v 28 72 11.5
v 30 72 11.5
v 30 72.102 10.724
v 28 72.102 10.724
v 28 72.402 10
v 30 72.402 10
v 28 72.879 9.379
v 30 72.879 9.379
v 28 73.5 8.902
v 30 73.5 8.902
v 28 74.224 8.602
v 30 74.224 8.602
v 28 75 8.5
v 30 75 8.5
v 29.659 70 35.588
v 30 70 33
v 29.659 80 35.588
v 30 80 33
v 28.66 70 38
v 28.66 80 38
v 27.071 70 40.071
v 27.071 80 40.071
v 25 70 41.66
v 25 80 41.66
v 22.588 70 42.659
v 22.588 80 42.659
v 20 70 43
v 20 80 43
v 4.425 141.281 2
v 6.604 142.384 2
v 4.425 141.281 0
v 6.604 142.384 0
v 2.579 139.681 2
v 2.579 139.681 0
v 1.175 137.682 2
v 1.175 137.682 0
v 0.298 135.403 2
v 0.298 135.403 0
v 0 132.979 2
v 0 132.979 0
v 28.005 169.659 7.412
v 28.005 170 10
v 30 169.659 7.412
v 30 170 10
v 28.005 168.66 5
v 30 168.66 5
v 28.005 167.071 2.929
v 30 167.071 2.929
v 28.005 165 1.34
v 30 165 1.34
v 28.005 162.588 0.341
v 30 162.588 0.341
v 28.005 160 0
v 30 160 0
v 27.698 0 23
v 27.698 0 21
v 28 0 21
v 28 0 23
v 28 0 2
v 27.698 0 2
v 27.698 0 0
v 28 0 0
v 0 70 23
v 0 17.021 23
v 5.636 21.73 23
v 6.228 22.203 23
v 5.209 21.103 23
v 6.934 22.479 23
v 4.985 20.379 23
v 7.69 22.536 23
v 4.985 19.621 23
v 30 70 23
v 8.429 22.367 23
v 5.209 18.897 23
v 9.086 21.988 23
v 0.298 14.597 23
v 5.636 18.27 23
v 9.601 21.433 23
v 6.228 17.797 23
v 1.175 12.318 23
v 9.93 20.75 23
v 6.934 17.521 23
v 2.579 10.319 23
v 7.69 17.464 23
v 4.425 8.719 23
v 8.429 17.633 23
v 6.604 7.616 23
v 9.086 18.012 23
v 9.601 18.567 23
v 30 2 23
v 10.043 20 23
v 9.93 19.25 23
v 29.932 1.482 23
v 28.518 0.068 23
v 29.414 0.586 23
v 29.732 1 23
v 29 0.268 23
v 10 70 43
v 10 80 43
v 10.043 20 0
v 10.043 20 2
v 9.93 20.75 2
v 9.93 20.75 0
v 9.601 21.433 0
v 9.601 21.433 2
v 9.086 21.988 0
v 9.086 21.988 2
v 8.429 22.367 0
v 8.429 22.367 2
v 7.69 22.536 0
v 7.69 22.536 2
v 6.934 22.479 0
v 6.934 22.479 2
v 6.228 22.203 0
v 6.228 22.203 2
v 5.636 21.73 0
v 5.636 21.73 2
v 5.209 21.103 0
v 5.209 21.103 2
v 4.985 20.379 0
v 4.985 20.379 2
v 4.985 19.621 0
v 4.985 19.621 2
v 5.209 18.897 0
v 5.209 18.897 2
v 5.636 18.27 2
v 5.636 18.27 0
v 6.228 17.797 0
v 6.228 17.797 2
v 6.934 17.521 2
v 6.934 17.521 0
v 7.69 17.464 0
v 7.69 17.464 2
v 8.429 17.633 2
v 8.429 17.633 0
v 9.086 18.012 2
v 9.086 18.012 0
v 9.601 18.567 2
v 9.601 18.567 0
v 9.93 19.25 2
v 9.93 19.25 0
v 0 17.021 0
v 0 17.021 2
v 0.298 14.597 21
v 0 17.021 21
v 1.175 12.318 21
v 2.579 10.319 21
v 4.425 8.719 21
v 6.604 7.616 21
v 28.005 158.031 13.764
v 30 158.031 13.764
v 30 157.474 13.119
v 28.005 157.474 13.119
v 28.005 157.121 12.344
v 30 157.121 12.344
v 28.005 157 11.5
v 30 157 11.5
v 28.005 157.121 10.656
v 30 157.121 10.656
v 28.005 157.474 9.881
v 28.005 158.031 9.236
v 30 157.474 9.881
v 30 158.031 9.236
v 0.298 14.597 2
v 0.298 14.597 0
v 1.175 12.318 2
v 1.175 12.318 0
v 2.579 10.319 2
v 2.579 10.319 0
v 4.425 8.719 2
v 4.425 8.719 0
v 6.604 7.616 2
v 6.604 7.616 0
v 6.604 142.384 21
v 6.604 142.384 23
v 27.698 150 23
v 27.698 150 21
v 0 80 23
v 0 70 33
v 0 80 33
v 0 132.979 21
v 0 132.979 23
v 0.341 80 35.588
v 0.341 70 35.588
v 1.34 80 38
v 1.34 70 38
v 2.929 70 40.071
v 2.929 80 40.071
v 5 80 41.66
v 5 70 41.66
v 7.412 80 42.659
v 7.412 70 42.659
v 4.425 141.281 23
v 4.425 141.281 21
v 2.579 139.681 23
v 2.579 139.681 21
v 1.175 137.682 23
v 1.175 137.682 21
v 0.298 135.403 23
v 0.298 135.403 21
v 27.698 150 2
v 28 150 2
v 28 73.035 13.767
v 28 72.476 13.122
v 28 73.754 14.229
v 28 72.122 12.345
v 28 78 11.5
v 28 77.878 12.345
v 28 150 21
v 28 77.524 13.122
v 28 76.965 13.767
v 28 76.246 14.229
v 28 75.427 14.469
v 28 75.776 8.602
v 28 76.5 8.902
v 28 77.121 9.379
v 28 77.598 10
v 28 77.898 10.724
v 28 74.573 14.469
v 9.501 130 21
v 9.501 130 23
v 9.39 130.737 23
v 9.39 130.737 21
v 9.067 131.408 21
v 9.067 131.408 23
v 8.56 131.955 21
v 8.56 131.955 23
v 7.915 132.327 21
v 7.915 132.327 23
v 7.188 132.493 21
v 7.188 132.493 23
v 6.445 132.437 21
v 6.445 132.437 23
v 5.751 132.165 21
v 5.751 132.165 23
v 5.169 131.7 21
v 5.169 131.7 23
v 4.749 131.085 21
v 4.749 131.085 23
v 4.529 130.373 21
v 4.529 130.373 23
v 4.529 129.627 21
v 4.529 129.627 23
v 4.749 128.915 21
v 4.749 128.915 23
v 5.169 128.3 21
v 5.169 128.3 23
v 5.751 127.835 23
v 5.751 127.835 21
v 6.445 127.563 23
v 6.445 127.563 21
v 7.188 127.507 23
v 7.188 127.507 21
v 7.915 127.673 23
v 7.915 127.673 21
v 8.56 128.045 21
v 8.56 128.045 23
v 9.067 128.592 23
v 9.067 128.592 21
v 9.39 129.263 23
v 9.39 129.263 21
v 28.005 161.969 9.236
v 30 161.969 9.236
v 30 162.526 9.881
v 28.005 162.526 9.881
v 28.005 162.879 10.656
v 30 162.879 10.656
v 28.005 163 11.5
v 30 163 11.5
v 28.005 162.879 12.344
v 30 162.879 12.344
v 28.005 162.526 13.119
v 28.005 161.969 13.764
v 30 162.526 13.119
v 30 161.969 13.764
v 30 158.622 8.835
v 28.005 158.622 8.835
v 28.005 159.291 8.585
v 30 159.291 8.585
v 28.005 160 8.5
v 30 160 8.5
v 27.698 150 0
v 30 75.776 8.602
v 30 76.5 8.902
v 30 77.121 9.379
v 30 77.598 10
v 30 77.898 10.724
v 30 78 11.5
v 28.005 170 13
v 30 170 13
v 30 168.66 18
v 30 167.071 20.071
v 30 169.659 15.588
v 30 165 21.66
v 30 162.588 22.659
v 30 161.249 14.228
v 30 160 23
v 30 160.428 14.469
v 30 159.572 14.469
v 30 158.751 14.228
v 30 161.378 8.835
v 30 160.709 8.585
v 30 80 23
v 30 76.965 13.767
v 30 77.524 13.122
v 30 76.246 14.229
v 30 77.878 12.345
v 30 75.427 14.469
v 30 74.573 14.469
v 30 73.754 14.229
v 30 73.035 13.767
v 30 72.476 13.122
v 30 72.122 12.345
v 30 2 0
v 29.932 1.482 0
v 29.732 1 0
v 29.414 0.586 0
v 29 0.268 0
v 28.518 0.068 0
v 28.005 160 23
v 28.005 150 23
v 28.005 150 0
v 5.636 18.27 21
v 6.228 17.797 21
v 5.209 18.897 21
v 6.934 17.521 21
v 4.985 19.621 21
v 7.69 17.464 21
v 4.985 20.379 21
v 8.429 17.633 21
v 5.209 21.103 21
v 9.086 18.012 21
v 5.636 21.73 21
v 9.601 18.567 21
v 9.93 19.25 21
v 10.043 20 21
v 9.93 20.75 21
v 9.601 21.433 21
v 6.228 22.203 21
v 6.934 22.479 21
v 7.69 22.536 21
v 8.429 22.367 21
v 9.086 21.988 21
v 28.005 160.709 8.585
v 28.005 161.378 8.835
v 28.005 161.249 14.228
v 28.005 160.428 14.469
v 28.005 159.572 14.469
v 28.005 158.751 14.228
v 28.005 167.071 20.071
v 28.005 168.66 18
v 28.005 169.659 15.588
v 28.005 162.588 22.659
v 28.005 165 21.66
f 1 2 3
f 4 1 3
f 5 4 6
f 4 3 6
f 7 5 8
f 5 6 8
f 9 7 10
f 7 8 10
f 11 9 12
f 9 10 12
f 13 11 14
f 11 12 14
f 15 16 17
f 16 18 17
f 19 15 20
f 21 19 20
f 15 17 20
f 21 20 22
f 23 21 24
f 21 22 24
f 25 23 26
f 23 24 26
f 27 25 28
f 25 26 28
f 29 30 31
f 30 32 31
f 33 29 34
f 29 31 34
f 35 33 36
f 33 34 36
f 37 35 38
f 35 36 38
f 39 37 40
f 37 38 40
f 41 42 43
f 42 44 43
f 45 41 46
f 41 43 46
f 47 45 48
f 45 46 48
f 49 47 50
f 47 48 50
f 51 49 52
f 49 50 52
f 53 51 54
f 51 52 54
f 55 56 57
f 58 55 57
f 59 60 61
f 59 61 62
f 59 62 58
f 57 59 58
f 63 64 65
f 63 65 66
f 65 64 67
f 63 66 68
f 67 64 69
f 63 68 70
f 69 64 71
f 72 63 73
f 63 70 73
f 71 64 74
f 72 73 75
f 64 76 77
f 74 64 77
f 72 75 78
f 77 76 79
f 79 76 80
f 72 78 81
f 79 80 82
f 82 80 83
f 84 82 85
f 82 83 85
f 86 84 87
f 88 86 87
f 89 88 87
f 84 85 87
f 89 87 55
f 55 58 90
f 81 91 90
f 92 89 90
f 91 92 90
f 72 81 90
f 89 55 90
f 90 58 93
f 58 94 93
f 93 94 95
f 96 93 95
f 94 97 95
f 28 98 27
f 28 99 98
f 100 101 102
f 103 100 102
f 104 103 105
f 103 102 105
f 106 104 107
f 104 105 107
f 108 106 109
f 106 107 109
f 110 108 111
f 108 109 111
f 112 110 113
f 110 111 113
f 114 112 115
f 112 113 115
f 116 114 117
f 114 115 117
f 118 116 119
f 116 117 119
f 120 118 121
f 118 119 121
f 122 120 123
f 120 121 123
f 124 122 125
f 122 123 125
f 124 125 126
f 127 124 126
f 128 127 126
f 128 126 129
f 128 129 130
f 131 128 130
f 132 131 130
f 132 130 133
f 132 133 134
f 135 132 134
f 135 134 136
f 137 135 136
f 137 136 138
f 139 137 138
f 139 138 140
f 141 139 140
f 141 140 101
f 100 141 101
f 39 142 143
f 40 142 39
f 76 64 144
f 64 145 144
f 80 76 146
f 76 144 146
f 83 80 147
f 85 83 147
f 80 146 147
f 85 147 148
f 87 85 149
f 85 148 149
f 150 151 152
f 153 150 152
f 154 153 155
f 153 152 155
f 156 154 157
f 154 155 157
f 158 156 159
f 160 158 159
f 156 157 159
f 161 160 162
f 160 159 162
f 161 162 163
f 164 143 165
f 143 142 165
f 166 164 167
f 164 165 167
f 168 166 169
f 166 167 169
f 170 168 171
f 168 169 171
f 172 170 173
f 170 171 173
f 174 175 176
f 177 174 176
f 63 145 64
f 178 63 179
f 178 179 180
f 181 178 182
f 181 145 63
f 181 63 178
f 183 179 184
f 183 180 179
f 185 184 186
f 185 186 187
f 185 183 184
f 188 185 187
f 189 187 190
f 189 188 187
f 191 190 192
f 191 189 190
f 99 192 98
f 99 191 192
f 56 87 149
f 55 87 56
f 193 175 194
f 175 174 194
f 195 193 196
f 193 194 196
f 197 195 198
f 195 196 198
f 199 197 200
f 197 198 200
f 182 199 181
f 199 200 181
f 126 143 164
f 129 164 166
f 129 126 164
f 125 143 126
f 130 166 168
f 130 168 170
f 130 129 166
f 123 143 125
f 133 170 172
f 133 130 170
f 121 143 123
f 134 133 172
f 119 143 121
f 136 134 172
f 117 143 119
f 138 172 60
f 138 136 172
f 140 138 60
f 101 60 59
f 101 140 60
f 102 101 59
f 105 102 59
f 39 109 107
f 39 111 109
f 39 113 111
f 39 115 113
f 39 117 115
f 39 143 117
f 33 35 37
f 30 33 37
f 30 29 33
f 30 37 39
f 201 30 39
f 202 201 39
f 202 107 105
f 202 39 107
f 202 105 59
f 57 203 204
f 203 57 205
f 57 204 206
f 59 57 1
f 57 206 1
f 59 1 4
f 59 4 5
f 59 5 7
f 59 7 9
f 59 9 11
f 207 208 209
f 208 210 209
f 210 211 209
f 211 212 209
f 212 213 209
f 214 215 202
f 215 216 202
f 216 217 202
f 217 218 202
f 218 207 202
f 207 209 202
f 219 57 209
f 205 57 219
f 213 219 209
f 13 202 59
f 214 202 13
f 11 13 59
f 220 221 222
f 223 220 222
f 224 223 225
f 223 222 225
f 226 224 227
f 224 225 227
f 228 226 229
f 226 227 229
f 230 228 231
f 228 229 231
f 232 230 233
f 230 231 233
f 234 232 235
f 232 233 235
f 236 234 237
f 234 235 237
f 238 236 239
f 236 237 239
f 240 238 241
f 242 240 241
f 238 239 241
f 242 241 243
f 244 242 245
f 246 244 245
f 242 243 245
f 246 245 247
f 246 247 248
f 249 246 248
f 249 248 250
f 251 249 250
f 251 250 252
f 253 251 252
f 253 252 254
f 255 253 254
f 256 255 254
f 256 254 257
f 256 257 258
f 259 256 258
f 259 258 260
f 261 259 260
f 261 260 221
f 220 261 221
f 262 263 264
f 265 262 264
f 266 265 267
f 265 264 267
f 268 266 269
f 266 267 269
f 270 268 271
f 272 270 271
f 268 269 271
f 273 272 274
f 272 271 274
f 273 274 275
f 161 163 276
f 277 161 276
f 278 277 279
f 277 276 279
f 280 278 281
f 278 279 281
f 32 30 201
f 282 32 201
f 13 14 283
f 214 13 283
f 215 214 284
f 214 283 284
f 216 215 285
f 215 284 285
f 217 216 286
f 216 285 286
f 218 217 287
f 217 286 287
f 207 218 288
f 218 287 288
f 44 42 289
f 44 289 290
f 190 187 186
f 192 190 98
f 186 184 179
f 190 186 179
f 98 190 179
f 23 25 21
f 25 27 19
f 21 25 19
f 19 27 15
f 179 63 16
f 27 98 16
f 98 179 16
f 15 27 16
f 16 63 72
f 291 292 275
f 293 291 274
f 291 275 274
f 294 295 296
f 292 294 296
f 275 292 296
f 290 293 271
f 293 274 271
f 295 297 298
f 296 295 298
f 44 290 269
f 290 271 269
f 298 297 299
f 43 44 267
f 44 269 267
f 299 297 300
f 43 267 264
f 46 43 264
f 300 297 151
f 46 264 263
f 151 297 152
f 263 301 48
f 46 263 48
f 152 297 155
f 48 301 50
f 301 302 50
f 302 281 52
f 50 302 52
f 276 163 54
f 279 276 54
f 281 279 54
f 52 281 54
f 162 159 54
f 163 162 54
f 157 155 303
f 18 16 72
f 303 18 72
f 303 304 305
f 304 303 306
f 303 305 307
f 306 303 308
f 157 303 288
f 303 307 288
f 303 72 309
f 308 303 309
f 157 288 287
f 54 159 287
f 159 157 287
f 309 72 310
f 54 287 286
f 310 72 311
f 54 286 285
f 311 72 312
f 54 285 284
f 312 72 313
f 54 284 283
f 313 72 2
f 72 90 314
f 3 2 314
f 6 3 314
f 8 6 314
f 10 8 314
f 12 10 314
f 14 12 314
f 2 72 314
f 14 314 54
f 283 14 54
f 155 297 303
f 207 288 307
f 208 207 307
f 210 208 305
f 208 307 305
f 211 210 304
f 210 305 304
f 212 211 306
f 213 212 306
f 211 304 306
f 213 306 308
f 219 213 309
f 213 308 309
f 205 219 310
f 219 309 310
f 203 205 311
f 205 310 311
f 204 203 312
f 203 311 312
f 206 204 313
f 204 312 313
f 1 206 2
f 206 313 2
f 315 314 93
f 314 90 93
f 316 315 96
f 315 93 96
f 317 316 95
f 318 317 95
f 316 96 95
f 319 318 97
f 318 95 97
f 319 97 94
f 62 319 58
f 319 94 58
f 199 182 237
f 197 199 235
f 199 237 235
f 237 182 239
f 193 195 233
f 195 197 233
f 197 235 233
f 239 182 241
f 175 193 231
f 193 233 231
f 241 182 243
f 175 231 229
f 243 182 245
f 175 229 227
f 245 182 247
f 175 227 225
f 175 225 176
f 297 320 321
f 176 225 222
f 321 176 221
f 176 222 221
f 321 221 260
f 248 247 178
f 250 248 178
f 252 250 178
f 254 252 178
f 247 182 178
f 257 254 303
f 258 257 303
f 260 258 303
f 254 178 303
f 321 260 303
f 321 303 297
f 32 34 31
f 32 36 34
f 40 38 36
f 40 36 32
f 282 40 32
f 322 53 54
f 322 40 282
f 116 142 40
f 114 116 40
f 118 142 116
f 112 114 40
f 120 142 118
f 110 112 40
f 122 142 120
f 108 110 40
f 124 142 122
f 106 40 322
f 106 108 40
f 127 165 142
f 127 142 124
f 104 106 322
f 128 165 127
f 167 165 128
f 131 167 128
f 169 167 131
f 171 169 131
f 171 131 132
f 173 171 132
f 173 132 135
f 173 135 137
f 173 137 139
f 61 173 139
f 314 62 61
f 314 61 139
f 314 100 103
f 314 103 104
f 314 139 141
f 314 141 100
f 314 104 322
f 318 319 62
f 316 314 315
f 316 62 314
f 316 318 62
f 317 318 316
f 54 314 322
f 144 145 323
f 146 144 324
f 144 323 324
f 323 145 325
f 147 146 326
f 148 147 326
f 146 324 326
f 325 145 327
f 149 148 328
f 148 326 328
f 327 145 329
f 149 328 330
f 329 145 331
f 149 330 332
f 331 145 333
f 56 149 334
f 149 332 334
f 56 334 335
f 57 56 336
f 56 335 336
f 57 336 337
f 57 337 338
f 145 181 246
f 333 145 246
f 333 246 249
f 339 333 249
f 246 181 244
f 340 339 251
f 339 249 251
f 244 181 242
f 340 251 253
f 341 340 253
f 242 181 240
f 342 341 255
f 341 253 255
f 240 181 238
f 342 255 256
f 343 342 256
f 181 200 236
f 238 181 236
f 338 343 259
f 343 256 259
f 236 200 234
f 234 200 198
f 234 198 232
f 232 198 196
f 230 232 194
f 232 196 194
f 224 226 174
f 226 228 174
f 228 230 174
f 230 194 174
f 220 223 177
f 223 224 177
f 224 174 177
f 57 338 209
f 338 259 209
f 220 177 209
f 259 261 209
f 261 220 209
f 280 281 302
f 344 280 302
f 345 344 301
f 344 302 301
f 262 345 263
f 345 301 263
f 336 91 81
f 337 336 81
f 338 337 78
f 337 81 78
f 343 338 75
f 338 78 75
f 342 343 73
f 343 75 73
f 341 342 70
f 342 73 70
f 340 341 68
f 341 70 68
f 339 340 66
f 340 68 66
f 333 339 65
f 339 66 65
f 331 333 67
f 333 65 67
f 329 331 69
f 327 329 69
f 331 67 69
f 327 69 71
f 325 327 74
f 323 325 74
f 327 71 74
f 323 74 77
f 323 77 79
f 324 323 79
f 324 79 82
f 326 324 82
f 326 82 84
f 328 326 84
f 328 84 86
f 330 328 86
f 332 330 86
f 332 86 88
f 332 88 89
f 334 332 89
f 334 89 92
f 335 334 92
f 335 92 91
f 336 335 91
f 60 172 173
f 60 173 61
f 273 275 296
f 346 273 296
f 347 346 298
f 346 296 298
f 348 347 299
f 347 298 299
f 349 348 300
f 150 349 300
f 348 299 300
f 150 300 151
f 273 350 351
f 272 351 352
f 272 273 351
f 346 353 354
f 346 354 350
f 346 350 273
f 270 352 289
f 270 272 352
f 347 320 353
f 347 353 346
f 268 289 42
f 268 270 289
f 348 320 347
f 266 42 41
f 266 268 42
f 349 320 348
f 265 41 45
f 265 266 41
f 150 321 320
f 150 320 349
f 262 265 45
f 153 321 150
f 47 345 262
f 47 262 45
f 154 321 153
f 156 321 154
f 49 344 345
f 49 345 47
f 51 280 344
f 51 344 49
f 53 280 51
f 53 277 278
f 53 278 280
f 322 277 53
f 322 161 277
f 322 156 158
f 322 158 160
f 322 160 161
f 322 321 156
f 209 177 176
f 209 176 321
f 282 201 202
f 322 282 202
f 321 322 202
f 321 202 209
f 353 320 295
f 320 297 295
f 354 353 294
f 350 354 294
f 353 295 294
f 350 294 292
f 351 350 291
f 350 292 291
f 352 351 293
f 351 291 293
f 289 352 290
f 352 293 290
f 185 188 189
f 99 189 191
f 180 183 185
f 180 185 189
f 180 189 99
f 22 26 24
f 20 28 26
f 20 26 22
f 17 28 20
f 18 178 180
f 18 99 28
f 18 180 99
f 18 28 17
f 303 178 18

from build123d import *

# Parameters (mm, degrees)
SKETCH1_W           = 30
SKETCH1_H           = 150
BOSS_EXTRUDE2_DEPTH = 23
SKETCH3_W           = 28
SKETCH3_H           = 19
CUT_EXTRUDE1_DEPTH  = 193
SKETCH7_W           = 1.99467658
SKETCH7_H           = 23
BOSS_EXTRUDE4_DEPTH = 20
CUT_EXTRUDE2_DEPTH  = 20
SKETCH9_W           = 30
SKETCH9_H           = 10
BOSS_EXTRUDE5_DEPTH = 20
SKETCH11_R          = 2.5
CUT_EXTRUDE4_DEPTH  = 10
CUT_EXTRUDE5_DEPTH  = 30
FILLET1_R           = 10
SKETCH13_R          = 2.543230184
CUT_EXTRUDE6_DEPTH  = 30
FILLET2_R           = 10
FILLET3_R           = 10
FILLET4_R           = 2


with BuildPart() as part:
    # Sketch1 → Boss-Extrude2 (new body)
    with BuildSketch(Plane.XY):
        with Locations((15, 75)):
            Rectangle(SKETCH1_W, SKETCH1_H)
    extrude(amount=BOSS_EXTRUDE2_DEPTH)

    # Sketch3 → Cut-Extrude1 (cut)
    with BuildSketch(Plane(origin=(0, 150, 0), x_dir=(1, 0, 0), z_dir=(0, 1, 0))):
        with Locations((14, -11.5)):
            Rectangle(SKETCH3_W, SKETCH3_H)
    extrude(amount=-CUT_EXTRUDE1_DEPTH, mode=Mode.SUBTRACT)

    # Sketch7 → Boss-Extrude4 (add)
    with BuildSketch(Plane(origin=(0, 150, 0), x_dir=(1, 0, 0), z_dir=(0, 1, 0))):
        with Locations((29.00266171, -11.5)):
            Rectangle(SKETCH7_W, SKETCH7_H)
    extrude(amount=BOSS_EXTRUDE4_DEPTH)

    # Sketch8 → Cut-Extrude2 (cut)
    with BuildSketch(Plane(origin=(30, 0, 0), x_dir=(0, 0, -1), z_dir=(1, 0, 0))):
        with BuildLine():
            ThreePointArc((-11.5, 78), (-14.5, 75), (-11.5, 72))
            Line((-11.5, 72), (-11.5, 78))
        make_face()
        with BuildLine():
            Line((-11.5, 78), (-11.5, 72))
            ThreePointArc((-11.5, 72), (-9.378679656, 72.878679656), (-8.5, 75))
            ThreePointArc((-8.5, 75), (-9.378679656, 77.121320344), (-11.5, 78))
        make_face()
        with BuildLine():
            ThreePointArc((-13.763816566, 158.031463855), (-11.5, 157), (-9.236183434, 158.031463855))
            Line((-9.236183434, 158.031463855), (-11.5, 160))
            Line((-11.5, 160), (-13.763816566, 158.031463855))
        make_face()
        with BuildLine():
            Line((-11.5, 160), (-9.236183434, 158.031463855))
            ThreePointArc((-9.236183434, 158.031463855), (-8.690066754, 158.94915503), (-8.5, 160))
            ThreePointArc((-8.5, 160), (-8.690066754, 161.05084497), (-9.236183434, 161.968536145))
            Line((-9.236183434, 161.968536145), (-11.5, 160))
        make_face()
        with BuildLine():
            ThreePointArc((-13.763816566, 161.968536145), (-14.5, 160), (-13.763816566, 158.031463855))
            Line((-13.763816566, 158.031463855), (-11.5, 160))
            Line((-11.5, 160), (-13.763816566, 161.968536145))
        make_face()
        with BuildLine():
            Line((-11.5, 160), (-9.236183434, 161.968536145))
            ThreePointArc((-9.236183434, 161.968536145), (-11.5, 163), (-13.763816566, 161.968536145))
            Line((-13.763816566, 161.968536145), (-11.5, 160))
        make_face()
    extrude(amount=-CUT_EXTRUDE2_DEPTH, mode=Mode.SUBTRACT)

    # Sketch9 → Boss-Extrude5 (add)
    with BuildSketch(Plane.XY.offset(23)):
        with Locations((15, 75)):
            Rectangle(SKETCH9_W, SKETCH9_H)
    extrude(amount=BOSS_EXTRUDE5_DEPTH)

    # Sketch11 → Cut-Extrude4 (cut)
    with BuildSketch(Plane.XY.offset(23)):
        with Locations((7.001330855, 130)):
            Circle(SKETCH11_R)
        with Locations((7.5, 20)):
            Circle(SKETCH11_R)
    extrude(amount=-CUT_EXTRUDE4_DEPTH, mode=Mode.SUBTRACT)

    # Sketch12 → Cut-Extrude5 (cut)
    with BuildSketch(Plane.XY.offset(23)):
        Polygon((27.698367508, 150), (0, 150), (0, 140), align=None)
        Polygon((0, 0), (0, 10), (27.698367508, 0), align=None)
    extrude(amount=-CUT_EXTRUDE5_DEPTH, mode=Mode.SUBTRACT)

    # Fillet1
    fillet1_edges = [part.edges().sort_by_distance(p)[0] for p in [
        (0, 140, 1),
        (0, 10, 22),
        (0, 10, 1),
        (0, 140, 22),
    ]]
    fillet(fillet1_edges, radius=FILLET1_R)

    # Sketch13 → Cut-Extrude6 (cut)
    with BuildSketch(Plane.XY.offset(23)):
        with Locations((7.5, 20)):
            Circle(SKETCH13_R)
    extrude(amount=-CUT_EXTRUDE6_DEPTH, mode=Mode.SUBTRACT)

    # Fillet2
    fillet2_edges = [part.edges().sort_by_distance(p)[0] for p in [
        (0, 75, 43),
        (30, 75, 43),
    ]]
    fillet(fillet2_edges, radius=FILLET2_R)

    # Fillet3
    fillet3_edges = [part.edges().sort_by_distance(p)[0] for p in [
        (29.00266171, 170, 23),
        (29.00266171, 170, 0),
    ]]
    fillet(fillet3_edges, radius=FILLET3_R)

    # Fillet4
    fillet4_edges = [part.edges().sort_by_distance(p)[0] for p in [
        (30, 0, 11.5),
    ]]
    fillet(fillet4_edges, radius=FILLET4_R - 0.0001)  # a hair under: the kernel refuses the full size


solid = part.part
